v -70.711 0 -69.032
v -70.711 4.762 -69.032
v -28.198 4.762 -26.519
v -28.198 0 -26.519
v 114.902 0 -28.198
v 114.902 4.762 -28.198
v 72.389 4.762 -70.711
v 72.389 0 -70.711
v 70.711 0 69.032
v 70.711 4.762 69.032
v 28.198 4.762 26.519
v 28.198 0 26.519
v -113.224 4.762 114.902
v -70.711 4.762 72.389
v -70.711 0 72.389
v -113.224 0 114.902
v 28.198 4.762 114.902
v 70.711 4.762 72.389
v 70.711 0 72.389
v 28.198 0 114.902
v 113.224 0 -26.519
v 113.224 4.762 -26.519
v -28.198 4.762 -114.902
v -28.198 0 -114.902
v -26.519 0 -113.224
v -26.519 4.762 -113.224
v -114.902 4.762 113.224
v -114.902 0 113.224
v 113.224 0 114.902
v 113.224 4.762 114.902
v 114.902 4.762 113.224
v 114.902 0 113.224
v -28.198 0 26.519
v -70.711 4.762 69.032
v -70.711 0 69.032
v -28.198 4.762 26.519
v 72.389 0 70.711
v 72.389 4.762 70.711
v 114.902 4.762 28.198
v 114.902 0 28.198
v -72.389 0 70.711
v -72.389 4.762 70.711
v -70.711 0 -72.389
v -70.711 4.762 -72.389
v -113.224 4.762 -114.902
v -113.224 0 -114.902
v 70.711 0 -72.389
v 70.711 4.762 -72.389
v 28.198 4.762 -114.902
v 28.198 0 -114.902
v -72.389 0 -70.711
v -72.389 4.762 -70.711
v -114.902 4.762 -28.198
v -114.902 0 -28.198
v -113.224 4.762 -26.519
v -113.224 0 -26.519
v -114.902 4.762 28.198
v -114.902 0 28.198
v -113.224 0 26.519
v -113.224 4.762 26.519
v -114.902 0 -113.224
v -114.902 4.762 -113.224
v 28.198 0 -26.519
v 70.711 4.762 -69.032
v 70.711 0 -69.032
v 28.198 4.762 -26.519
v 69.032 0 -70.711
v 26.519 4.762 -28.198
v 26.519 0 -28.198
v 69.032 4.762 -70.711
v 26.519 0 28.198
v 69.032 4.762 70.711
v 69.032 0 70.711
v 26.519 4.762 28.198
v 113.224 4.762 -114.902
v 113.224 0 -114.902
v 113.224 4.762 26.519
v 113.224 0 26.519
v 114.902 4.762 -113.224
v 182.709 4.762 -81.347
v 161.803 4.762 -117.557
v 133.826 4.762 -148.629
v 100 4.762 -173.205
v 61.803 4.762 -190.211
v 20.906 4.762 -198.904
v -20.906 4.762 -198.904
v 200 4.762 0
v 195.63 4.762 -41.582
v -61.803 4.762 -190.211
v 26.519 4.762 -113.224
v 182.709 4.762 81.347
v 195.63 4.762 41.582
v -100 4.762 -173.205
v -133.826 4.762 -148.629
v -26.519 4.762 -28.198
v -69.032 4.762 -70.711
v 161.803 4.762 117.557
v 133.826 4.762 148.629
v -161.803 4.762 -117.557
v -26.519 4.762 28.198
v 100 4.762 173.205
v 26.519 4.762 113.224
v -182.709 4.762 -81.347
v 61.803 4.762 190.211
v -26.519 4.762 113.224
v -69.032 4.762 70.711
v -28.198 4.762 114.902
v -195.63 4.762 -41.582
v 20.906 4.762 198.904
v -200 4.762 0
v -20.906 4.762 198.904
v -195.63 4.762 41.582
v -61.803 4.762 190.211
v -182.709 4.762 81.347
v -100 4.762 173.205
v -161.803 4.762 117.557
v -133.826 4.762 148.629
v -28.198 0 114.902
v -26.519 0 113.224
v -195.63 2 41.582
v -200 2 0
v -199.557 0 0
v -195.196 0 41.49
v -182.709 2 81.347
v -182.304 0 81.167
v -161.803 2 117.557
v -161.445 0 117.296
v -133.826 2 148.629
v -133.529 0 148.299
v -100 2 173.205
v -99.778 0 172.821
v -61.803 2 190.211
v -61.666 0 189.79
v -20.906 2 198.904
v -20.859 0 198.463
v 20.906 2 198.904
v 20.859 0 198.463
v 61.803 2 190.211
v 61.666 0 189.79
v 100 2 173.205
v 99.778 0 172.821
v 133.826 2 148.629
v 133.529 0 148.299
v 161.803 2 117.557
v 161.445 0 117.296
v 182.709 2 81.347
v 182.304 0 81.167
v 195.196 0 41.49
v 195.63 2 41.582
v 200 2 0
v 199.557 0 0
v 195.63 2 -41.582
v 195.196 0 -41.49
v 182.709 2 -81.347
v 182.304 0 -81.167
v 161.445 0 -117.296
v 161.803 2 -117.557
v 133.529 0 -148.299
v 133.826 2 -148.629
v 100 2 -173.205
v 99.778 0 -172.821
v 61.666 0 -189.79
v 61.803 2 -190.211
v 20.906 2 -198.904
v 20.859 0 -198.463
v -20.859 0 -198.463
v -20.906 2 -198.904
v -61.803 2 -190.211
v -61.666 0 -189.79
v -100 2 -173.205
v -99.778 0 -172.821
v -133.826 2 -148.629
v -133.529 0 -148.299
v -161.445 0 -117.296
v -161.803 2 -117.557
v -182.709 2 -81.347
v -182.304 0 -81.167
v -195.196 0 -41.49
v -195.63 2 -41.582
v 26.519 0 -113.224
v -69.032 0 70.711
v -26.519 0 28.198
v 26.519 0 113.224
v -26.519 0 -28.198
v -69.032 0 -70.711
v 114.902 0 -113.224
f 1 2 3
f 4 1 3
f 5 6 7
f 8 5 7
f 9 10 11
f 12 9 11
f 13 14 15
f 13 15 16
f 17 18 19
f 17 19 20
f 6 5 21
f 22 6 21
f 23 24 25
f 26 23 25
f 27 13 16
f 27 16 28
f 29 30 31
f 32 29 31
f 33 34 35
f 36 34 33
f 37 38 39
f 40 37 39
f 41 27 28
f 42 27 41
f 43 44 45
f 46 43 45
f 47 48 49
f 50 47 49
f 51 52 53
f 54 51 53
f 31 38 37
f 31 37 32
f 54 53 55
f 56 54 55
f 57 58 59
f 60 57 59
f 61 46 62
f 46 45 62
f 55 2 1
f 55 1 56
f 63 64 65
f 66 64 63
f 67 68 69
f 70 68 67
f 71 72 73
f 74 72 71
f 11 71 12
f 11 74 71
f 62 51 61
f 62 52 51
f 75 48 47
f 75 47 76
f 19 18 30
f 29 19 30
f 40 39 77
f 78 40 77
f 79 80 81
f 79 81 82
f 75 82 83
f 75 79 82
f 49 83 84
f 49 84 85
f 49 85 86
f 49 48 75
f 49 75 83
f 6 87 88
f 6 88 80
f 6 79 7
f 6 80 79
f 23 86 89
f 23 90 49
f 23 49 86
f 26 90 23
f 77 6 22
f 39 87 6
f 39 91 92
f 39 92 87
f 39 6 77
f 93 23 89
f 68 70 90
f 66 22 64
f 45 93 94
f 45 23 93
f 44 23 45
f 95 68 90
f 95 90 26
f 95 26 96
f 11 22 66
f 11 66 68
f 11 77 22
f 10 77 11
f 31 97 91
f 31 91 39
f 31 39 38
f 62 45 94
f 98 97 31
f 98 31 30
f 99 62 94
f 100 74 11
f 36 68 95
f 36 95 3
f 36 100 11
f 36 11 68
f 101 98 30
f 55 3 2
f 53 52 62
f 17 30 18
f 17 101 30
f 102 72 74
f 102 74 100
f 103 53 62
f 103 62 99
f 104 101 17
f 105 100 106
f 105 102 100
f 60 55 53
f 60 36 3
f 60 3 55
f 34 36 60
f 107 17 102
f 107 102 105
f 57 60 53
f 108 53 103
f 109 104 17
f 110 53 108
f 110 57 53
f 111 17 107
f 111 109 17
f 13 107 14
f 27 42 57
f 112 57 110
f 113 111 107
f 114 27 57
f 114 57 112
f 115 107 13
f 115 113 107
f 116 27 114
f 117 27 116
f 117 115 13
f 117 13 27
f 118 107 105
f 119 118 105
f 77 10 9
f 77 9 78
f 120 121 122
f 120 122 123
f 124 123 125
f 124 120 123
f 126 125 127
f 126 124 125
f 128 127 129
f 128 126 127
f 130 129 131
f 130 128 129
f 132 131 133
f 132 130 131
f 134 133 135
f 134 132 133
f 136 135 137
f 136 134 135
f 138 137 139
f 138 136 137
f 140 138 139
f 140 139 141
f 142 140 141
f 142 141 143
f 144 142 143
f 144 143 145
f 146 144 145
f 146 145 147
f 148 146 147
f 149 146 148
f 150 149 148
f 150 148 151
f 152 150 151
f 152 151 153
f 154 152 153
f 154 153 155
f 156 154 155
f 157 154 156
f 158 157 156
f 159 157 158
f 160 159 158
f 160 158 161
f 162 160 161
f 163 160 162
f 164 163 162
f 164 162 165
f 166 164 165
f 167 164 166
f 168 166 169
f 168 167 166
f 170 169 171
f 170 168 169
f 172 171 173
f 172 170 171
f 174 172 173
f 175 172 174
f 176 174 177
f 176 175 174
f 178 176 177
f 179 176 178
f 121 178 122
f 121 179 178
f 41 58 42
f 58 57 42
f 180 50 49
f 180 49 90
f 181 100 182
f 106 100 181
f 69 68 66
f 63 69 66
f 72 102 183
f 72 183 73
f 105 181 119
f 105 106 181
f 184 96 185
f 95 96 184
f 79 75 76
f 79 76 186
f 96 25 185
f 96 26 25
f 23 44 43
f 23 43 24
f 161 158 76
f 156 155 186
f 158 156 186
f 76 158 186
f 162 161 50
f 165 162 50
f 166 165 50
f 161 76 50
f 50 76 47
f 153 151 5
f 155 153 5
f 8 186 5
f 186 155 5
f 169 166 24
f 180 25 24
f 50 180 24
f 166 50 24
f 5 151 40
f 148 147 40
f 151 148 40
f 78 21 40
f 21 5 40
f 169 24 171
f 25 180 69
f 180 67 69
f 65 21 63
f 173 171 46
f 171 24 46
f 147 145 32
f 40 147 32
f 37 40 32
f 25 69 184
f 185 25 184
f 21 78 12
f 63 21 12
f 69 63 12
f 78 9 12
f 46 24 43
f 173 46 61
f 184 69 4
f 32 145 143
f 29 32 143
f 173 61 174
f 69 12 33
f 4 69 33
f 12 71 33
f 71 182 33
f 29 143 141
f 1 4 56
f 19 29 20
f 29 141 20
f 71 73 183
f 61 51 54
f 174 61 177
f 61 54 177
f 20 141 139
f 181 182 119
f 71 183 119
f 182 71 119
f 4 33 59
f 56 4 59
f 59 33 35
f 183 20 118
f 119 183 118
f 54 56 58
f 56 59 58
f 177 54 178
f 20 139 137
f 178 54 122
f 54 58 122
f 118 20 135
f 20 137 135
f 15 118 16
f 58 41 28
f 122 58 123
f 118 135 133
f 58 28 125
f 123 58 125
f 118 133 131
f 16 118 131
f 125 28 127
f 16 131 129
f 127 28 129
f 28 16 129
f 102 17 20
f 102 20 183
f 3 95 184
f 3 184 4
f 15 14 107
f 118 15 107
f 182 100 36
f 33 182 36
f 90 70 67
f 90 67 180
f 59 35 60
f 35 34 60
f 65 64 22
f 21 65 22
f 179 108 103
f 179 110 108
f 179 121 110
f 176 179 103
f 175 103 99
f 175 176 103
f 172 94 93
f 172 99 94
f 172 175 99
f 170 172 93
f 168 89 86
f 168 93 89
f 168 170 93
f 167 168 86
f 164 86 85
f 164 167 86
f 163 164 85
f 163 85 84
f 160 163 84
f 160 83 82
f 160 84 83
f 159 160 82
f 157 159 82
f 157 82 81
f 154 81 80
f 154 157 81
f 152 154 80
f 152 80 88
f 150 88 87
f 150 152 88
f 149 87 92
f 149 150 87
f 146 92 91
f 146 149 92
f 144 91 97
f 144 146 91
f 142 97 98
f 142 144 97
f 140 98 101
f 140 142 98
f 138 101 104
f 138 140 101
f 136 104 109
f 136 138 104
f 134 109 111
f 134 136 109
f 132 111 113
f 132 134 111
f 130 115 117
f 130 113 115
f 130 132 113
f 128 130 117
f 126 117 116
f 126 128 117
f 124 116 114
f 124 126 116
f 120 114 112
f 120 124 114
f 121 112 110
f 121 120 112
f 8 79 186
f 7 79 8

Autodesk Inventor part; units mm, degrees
ref_plane "YZ Plane" through (0, 0, 0) normal (1, 0, 0) x (0, 1, 0)
ref_plane "XZ Plane" through (0, 0, 0) normal (0, 1, 0) x (-1, 0, 0)
ref_plane "XY Plane" through (0, 0, 0) normal (0, 0, 1) x (1, 0, 0)
sketch "Sketch1" plane through (0, 0, 0) normal (0, 1, 0) x (-1, 0, 0)
  circle A0 centre (0, 0) radius 200
  dimension "d0" = 400
extrude "Extrusion1" add sketch "Sketch1" along normal blind 4.7625
chamfer "Chamfer1" distance 2 angle 12.5 1 edges at (200, 0, 0) measured on face at (94.1877, 1.5875, -176.4332)
sketch "Sketch2" plane through (0, 4.7625, 0) normal (0, 1, 0) x (1, 0, 0)
  line L0 (0, 0) -> (200, 0) construction
  line L1 (0, 0) -> (160, 0) construction
  line L2 (0, 0) -> (100, 0) construction
  line L3 (88.3859, -54.7142) -> (54.7142, -88.3859)
  line L4 (54.7142, -88.3859) -> (53.0355, -86.7072)
  line L5 (53.0355, -86.7072) -> (86.7072, -53.0355)
  line L6 (88.3859, -54.7142) -> (86.7072, -53.0355)
  line L7 (54.7142, -53.0355) -> (53.0355, -54.7142)
  line L8 (53.0355, -54.7142) -> (86.7072, -88.3859)
  line L9 (86.7072, -88.3859) -> (88.3859, -86.7072)
  line L10 (88.3859, -86.7072) -> (54.7142, -53.0355)
  circle A0 centre (0, 0) radius 200 projected
  line L11 (-88.3859, -54.7142) -> (-54.7142, -88.3859)
  line L12 (-54.7142, -88.3859) -> (-53.0355, -86.7072)
  line L13 (-53.0355, -86.7072) -> (-86.7072, -53.0355)
  line L14 (-88.3859, -54.7142) -> (-86.7072, -53.0355)
  line L15 (-54.7142, -53.0355) -> (-53.0355, -54.7142)
  line L16 (-53.0355, -54.7142) -> (-86.7072, -88.3859)
  line L17 (-86.7072, -88.3859) -> (-88.3859, -86.7072)
  line L18 (-88.3859, -86.7072) -> (-54.7142, -53.0355)
  line L19 (88.3859, 54.7142) -> (54.7142, 88.3859)
  line L20 (54.7142, 88.3859) -> (53.0355, 86.7072)
  line L21 (53.0355, 86.7072) -> (86.7072, 53.0355)
  line L22 (88.3859, 54.7142) -> (86.7072, 53.0355)
  line L23 (54.7142, 53.0355) -> (53.0355, 54.7142)
  line L24 (53.0355, 54.7142) -> (86.7072, 88.3859)
  line L25 (86.7072, 88.3859) -> (88.3859, 86.7072)
  line L26 (88.3859, 86.7072) -> (54.7142, 53.0355)
  line L27 (-88.3859, 54.7142) -> (-54.7142, 88.3859)
  line L28 (-54.7142, 88.3859) -> (-53.0355, 86.7072)
  line L29 (-53.0355, 86.7072) -> (-86.7072, 53.0355)
  line L30 (-53.0355, 54.7142) -> (-86.7072, 88.3859)
  line L31 (-88.3859, 86.7072) -> (-54.7142, 53.0355)
  line L32 (-86.7072, 88.3859) -> (-88.3859, 86.7072)
  line L33 (-88.3859, 54.7142) -> (-86.7072, 53.0355)
  line L34 (-54.7142, 53.0355) -> (-53.0355, 54.7142)
  point P0 (69.032, 70.7107)
  point P1 (70.7107, 69.032)
  point P2 (72.3893, 70.7107)
  point P3 (70.7107, 72.3893)
  point P4 (-69.032, 70.7107)
  point P5 (-70.7107, 72.3893)
  point P6 (-72.3893, 70.7107)
  point P7 (-70.7107, 69.032)
  point P8 (-72.3893, -70.7107)
  point P9 (-70.7107, -72.3893)
  point P10 (-69.032, -70.7107)
  point P11 (-70.7107, -69.032)
  point P12 (72.3893, -70.7107)
  point P13 (70.7107, -69.032)
  point P14 (69.032, -70.7107)
  point P15 (70.7107, -72.3893)
  dimension "d16" = 2.374
  dimension "d20" = 47.619
extrude "Extrusion2" cut sketch "Sketch2" against normal blind 10 contours L3 L10 L5 L6 | L10 L9 L8 L3 | L3 L8 L5 L10 | L3 L4 L5 L8 | L5 L8 L7 L10 | L14 L13 L18 L11 | L18 L13 L16 L11 | L11 L16 L17 L18 | L16 L13 L12 L11 | L18 L15 L16 L13 | L22 L21 L26 L19 | L26 L21 L24 L19 | L19 L24 L25 L26 | L24 L21 L20 L19 | L26 L23 L24 L21 | L27 L31 L29 L33 | L31 L32 L30 L27 | L27 L30 L29 L31 | L27 L28 L29 L30 | L29 L30 L34 L31
sketch "Sketch3" plane through (0, 4.7625, 0) normal (0, 1, 0) x (1, 0, 0)
  line L0 (-54.7142, 53.0355) -> (-28.1977, 26.519)
  line L1 (-53.0355, 54.7142) -> (-26.519, 28.1977)
  line L2 (-26.519, 28.1977) -> (-28.1977, 26.519)
  line L3 (-53.0355, 54.7142) -> (-54.7142, 53.0355)
  line L4 (-88.3859, 86.7072) -> (-114.9024, 113.2237)
  line L5 (-86.7072, 88.3859) -> (-113.2237, 114.9024)
  line L6 (-113.2237, 114.9024) -> (-114.9024, 113.2237)
  line L7 (-86.7072, 88.3859) -> (-88.3859, 86.7072)
  line L8 (-54.7142, 88.3859) -> (-53.0355, 86.7072)
  line L9 (-53.0355, 86.7072) -> (-26.519, 113.2237)
  line L10 (-54.7142, 88.3859) -> (-28.1977, 114.9024)
  line L11 (-28.1977, 114.9024) -> (-26.519, 113.2237)
  line L12 (-88.3859, 54.7142) -> (-86.7072, 53.0355)
  line L13 (-86.7072, 53.0355) -> (-113.2237, 26.519)
  line L14 (-88.3859, 54.7142) -> (-114.9024, 28.1977)
  line L15 (-114.9024, 28.1977) -> (-113.2237, 26.519)
  circle A0 centre (0, 0) radius 200 projected
  line L16 (-54.7142, -53.0355) -> (-28.1977, -26.519)
  line L17 (-53.0355, -54.7142) -> (-26.519, -28.1977)
  line L18 (-26.519, -28.1977) -> (-28.1977, -26.519)
  line L19 (-53.0355, -54.7142) -> (-54.7142, -53.0355)
  line L20 (-86.7072, -88.3859) -> (-113.2237, -114.9024)
  line L21 (-86.7072, -88.3859) -> (-88.3859, -86.7072)
  line L22 (-88.3859, -86.7072) -> (-114.9024, -113.2237)
  line L23 (-113.2237, -114.9024) -> (-114.9024, -113.2237)
  line L24 (-54.7142, -88.3859) -> (-53.0355, -86.7072)
  line L25 (-53.0355, -86.7072) -> (-26.519, -113.2237)
  line L26 (-54.7142, -88.3859) -> (-28.1977, -114.9024)
  line L27 (-28.1977, -114.9024) -> (-26.519, -113.2237)
  line L28 (-114.9024, -28.1977) -> (-113.2237, -26.519)
  line L29 (-88.3859, -54.7142) -> (-114.9024, -28.1977)
  line L30 (-86.7072, -53.0355) -> (-113.2237, -26.519)
  line L31 (-88.3859, -54.7142) -> (-86.7072, -53.0355)
  line L32 (54.7142, 53.0355) -> (28.1977, 26.519)
  line L33 (53.0355, 54.7142) -> (26.519, 28.1977)
  line L34 (26.519, 28.1977) -> (28.1977, 26.519)
  line L35 (53.0355, 54.7142) -> (54.7142, 53.0355)
  line L36 (86.7072, 88.3859) -> (113.2237, 114.9024)
  line L37 (86.7072, 88.3859) -> (88.3859, 86.7072)
  line L38 (88.3859, 86.7072) -> (114.9024, 113.2237)
  line L39 (113.2237, 114.9024) -> (114.9024, 113.2237)
  line L40 (54.7142, 88.3859) -> (53.0355, 86.7072)
  line L41 (53.0355, 86.7072) -> (26.519, 113.2237)
  line L42 (54.7142, 88.3859) -> (28.1977, 114.9024)
  line L43 (28.1977, 114.9024) -> (26.519, 113.2237)
  line L44 (114.9024, 28.1977) -> (113.2237, 26.519)
  line L45 (88.3859, 54.7142) -> (114.9024, 28.1977)
  line L46 (86.7072, 53.0355) -> (113.2237, 26.519)
  line L47 (88.3859, 54.7142) -> (86.7072, 53.0355)
  line L48 (54.7142, -88.3859) -> (28.1977, -114.9024)
  line L49 (53.0355, -86.7072) -> (26.519, -113.2237)
  line L50 (54.7142, -88.3859) -> (53.0355, -86.7072)
  line L51 (28.1977, -114.9024) -> (26.519, -113.2237)
  line L52 (53.0355, -54.7142) -> (54.7142, -53.0355)
  line L53 (53.0355, -54.7142) -> (26.519, -28.1977)
  line L54 (54.7142, -53.0355) -> (28.1977, -26.519)
  line L55 (26.519, -28.1977) -> (28.1977, -26.519)
  line L56 (88.3859, -54.7142) -> (86.7072, -53.0355)
  line L57 (88.3859, -54.7142) -> (114.9024, -28.1977)
  line L58 (86.7072, -53.0355) -> (113.2237, -26.519)
  line L59 (114.9024, -28.1977) -> (113.2237, -26.519)
  line L60 (88.3859, -86.7072) -> (114.9024, -113.2237)
  line L61 (86.7072, -88.3859) -> (113.2237, -114.9024)
  line L62 (113.2237, -114.9024) -> (114.9024, -113.2237)
  line L63 (86.7072, -88.3859) -> (88.3859, -86.7072)
extrude "Extrusion3" cut sketch "Sketch3" against normal blind 10 contours L3 L1 L2 L0 | L4 L6 L5 L7 | L10 L11 L9 L8 | L12 L13 L15 L14 | L16 L18 L17 L19 | L20 L23 L22 L21 | L24 L25 L27 L26 | L28 L30 L31 L29 | L32 L34 L33 L35 | L36 L39 L38 L37 | L40 L41 L43 L42 | L44 L46 L47 L45 | L48 L51 L49 L50 | L53 L55 L54 L52 | L56 L58 L59 L57 | L60 L62 L61 L63
properties part number "Sustainable Chair_V2 - Seat" material "Foam Board - V3"
